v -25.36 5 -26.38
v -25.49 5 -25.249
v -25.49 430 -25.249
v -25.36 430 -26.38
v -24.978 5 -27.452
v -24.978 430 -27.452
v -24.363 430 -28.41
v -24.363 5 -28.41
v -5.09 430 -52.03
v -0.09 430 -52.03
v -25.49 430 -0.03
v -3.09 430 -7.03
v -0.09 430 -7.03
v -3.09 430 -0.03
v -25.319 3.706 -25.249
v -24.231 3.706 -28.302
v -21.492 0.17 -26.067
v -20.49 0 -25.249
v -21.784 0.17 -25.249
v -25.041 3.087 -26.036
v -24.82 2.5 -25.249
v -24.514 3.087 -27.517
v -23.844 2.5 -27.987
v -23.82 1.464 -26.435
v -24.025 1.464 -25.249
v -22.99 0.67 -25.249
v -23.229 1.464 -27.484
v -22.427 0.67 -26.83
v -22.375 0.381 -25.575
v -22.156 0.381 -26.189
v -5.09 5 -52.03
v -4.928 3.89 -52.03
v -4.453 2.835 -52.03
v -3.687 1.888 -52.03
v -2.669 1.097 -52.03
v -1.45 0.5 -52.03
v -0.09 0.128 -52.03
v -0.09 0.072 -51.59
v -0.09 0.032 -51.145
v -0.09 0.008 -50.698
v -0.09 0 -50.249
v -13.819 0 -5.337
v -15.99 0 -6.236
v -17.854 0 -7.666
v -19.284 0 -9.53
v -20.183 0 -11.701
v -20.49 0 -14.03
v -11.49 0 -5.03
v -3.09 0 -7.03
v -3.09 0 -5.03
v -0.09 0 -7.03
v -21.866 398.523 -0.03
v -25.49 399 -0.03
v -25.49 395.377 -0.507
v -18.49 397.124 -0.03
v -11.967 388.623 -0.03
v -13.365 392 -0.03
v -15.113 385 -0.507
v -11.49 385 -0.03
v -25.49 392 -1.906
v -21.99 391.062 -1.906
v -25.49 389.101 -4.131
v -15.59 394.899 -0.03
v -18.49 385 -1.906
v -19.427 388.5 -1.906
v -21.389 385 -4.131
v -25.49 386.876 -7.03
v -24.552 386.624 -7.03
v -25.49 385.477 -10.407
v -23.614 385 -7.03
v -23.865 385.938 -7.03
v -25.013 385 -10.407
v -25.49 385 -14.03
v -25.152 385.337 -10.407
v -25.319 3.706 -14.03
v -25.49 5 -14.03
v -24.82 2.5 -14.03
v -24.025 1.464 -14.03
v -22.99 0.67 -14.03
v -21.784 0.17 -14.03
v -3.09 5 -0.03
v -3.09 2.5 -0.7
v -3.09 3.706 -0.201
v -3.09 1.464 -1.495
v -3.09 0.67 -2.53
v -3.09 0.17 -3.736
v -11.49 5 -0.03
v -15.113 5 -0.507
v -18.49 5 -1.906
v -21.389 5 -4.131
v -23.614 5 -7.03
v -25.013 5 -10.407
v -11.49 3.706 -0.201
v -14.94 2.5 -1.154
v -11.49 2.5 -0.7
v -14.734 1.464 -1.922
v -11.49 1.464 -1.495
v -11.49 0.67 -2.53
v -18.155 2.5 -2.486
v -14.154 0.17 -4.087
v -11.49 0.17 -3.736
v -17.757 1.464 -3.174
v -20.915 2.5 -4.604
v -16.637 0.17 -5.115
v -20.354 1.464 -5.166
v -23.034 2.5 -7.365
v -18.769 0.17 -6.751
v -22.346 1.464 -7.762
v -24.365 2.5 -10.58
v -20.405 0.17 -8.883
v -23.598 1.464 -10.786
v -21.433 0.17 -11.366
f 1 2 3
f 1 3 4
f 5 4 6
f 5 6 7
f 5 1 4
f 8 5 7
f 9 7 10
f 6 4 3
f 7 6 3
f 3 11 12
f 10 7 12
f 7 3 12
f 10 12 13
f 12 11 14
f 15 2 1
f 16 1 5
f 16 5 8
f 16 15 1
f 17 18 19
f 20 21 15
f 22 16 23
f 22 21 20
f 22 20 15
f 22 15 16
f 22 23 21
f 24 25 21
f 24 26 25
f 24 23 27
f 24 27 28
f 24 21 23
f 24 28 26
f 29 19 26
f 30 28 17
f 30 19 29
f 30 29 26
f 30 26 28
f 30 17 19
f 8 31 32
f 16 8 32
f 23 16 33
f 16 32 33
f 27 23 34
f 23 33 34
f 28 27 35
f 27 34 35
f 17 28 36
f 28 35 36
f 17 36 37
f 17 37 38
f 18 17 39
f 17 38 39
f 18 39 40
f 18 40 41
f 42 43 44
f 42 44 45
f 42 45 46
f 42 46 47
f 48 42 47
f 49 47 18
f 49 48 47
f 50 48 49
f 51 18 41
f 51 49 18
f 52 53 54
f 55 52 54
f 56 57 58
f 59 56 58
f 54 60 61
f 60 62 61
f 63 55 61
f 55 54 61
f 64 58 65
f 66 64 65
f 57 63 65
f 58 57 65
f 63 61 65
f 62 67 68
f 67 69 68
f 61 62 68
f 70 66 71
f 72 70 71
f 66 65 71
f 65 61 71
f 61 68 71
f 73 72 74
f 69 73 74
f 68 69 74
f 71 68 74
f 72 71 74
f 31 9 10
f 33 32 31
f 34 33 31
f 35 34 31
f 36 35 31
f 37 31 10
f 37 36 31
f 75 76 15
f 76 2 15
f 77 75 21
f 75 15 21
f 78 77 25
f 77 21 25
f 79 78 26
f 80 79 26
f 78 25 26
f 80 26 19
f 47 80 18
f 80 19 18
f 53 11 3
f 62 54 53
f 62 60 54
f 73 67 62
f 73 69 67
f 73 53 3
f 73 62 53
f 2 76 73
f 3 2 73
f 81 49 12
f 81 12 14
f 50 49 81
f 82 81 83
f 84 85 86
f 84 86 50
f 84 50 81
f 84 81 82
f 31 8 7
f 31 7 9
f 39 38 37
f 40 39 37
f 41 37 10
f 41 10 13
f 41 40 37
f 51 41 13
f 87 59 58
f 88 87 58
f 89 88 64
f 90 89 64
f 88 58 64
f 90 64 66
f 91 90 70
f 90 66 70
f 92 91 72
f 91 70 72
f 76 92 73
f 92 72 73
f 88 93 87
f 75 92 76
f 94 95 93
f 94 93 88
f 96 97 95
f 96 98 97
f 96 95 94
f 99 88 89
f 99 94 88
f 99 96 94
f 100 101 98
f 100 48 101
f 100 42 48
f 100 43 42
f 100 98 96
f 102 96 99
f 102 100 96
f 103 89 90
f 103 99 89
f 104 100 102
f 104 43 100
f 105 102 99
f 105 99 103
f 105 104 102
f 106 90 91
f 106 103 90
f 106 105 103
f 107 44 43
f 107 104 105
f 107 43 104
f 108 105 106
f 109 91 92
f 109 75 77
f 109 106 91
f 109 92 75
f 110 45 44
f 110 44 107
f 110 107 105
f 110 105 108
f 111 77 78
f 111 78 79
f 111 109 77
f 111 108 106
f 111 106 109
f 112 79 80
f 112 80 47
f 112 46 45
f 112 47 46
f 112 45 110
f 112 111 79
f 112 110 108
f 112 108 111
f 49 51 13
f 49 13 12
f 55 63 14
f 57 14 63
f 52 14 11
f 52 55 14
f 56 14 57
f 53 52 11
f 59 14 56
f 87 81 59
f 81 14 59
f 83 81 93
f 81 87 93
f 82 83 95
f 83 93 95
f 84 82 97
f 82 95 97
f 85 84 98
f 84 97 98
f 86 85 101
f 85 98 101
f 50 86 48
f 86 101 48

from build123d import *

# Parameters (mm, degrees)
F1_DEPTH = 430
F3_W     = 14
F3_H     = 3.9684094482
F5_DEPTH = 385.0010001
F6_R     = 5


with BuildPart() as f1:
    # F0 (on Front) → F1 (new body)
    with BuildSketch(Plane.XZ):
        with BuildLine():
            Line((-3.0895532303, -0.0301503569), (-25.4895532303, -0.0301503569))
            Line((-25.4895532303, -0.0301503569), (-25.4895532303, -25.2490202056))
            ThreePointArc((-25.4895532303, -25.2490202056), (-25.1996290257, -26.9268718085), (-24.3634788298, -28.4101434948))
            Line((-24.3634788298, -28.4101434948), (-5.0895532303, -52.0301503569))
            Line((-5.0895532303, -52.0301503569), (-0.0895532303, -52.0301503569))
            Line((-0.0895532303, -52.0301503569), (-0.0895532303, -7.0301503569))
            Line((-0.0895532303, -7.0301503569), (-3.0895532303, -7.0301503569))
            Line((-3.0895532303, -7.0301503569), (-3.0895532303, -0.0301503569))
        make_face()
    extrude(amount=-F1_DEPTH)

    # F3 (on offset) → F4 (revolve, cut)
    with BuildSketch(Plane(origin=(0, 385, 0), x_dir=(-1, 0, 0), z_dir=(0, 1, 0))):
        with BuildLine():
            Line((25.4895532303, -14.0301503569), (25.4895532303, -0.0301503569))
            Line((25.4895532303, -0.0301503569), (11.4895532303, -0.0301503569))
            ThreePointArc((11.4895532303, -0.0301503569), (21.3890481669, -4.1306554203), (25.4895532303, -14.0301503569))
        make_face()
        with Locations((18.4895532303, 1.9540543671)):
            Rectangle(F3_W, F3_H)
    revolve(axis=Axis((-25.4895532303, 385, -5.0459456329), (0, 0, -1)), mode=Mode.SUBTRACT)

    # F3 (on offset) → F5 (cut, through all)
    with BuildSketch(Plane(origin=(0, 385, 0), x_dir=(-1, 0, 0), z_dir=(0, 1, 0))):
        with BuildLine():
            Line((25.4895532303, -14.0301503569), (25.4895532303, -0.0301503569))
            Line((25.4895532303, -0.0301503569), (11.4895532303, -0.0301503569))
            ThreePointArc((11.4895532303, -0.0301503569), (21.3890481669, -4.1306554203), (25.4895532303, -14.0301503569))
        make_face()
        with Locations((18.4895532303, 1.9540543671)):
            Rectangle(F3_W, F3_H)
    extrude(amount=-F5_DEPTH, mode=Mode.SUBTRACT)

    # F6
    f6_edges = [f1.edges().sort_by_distance(p)[0] for p in [
        (-7.289553, 0, -0.03015),
    ]]
    fillet(f6_edges, radius=F6_R)


solid = f1.part
